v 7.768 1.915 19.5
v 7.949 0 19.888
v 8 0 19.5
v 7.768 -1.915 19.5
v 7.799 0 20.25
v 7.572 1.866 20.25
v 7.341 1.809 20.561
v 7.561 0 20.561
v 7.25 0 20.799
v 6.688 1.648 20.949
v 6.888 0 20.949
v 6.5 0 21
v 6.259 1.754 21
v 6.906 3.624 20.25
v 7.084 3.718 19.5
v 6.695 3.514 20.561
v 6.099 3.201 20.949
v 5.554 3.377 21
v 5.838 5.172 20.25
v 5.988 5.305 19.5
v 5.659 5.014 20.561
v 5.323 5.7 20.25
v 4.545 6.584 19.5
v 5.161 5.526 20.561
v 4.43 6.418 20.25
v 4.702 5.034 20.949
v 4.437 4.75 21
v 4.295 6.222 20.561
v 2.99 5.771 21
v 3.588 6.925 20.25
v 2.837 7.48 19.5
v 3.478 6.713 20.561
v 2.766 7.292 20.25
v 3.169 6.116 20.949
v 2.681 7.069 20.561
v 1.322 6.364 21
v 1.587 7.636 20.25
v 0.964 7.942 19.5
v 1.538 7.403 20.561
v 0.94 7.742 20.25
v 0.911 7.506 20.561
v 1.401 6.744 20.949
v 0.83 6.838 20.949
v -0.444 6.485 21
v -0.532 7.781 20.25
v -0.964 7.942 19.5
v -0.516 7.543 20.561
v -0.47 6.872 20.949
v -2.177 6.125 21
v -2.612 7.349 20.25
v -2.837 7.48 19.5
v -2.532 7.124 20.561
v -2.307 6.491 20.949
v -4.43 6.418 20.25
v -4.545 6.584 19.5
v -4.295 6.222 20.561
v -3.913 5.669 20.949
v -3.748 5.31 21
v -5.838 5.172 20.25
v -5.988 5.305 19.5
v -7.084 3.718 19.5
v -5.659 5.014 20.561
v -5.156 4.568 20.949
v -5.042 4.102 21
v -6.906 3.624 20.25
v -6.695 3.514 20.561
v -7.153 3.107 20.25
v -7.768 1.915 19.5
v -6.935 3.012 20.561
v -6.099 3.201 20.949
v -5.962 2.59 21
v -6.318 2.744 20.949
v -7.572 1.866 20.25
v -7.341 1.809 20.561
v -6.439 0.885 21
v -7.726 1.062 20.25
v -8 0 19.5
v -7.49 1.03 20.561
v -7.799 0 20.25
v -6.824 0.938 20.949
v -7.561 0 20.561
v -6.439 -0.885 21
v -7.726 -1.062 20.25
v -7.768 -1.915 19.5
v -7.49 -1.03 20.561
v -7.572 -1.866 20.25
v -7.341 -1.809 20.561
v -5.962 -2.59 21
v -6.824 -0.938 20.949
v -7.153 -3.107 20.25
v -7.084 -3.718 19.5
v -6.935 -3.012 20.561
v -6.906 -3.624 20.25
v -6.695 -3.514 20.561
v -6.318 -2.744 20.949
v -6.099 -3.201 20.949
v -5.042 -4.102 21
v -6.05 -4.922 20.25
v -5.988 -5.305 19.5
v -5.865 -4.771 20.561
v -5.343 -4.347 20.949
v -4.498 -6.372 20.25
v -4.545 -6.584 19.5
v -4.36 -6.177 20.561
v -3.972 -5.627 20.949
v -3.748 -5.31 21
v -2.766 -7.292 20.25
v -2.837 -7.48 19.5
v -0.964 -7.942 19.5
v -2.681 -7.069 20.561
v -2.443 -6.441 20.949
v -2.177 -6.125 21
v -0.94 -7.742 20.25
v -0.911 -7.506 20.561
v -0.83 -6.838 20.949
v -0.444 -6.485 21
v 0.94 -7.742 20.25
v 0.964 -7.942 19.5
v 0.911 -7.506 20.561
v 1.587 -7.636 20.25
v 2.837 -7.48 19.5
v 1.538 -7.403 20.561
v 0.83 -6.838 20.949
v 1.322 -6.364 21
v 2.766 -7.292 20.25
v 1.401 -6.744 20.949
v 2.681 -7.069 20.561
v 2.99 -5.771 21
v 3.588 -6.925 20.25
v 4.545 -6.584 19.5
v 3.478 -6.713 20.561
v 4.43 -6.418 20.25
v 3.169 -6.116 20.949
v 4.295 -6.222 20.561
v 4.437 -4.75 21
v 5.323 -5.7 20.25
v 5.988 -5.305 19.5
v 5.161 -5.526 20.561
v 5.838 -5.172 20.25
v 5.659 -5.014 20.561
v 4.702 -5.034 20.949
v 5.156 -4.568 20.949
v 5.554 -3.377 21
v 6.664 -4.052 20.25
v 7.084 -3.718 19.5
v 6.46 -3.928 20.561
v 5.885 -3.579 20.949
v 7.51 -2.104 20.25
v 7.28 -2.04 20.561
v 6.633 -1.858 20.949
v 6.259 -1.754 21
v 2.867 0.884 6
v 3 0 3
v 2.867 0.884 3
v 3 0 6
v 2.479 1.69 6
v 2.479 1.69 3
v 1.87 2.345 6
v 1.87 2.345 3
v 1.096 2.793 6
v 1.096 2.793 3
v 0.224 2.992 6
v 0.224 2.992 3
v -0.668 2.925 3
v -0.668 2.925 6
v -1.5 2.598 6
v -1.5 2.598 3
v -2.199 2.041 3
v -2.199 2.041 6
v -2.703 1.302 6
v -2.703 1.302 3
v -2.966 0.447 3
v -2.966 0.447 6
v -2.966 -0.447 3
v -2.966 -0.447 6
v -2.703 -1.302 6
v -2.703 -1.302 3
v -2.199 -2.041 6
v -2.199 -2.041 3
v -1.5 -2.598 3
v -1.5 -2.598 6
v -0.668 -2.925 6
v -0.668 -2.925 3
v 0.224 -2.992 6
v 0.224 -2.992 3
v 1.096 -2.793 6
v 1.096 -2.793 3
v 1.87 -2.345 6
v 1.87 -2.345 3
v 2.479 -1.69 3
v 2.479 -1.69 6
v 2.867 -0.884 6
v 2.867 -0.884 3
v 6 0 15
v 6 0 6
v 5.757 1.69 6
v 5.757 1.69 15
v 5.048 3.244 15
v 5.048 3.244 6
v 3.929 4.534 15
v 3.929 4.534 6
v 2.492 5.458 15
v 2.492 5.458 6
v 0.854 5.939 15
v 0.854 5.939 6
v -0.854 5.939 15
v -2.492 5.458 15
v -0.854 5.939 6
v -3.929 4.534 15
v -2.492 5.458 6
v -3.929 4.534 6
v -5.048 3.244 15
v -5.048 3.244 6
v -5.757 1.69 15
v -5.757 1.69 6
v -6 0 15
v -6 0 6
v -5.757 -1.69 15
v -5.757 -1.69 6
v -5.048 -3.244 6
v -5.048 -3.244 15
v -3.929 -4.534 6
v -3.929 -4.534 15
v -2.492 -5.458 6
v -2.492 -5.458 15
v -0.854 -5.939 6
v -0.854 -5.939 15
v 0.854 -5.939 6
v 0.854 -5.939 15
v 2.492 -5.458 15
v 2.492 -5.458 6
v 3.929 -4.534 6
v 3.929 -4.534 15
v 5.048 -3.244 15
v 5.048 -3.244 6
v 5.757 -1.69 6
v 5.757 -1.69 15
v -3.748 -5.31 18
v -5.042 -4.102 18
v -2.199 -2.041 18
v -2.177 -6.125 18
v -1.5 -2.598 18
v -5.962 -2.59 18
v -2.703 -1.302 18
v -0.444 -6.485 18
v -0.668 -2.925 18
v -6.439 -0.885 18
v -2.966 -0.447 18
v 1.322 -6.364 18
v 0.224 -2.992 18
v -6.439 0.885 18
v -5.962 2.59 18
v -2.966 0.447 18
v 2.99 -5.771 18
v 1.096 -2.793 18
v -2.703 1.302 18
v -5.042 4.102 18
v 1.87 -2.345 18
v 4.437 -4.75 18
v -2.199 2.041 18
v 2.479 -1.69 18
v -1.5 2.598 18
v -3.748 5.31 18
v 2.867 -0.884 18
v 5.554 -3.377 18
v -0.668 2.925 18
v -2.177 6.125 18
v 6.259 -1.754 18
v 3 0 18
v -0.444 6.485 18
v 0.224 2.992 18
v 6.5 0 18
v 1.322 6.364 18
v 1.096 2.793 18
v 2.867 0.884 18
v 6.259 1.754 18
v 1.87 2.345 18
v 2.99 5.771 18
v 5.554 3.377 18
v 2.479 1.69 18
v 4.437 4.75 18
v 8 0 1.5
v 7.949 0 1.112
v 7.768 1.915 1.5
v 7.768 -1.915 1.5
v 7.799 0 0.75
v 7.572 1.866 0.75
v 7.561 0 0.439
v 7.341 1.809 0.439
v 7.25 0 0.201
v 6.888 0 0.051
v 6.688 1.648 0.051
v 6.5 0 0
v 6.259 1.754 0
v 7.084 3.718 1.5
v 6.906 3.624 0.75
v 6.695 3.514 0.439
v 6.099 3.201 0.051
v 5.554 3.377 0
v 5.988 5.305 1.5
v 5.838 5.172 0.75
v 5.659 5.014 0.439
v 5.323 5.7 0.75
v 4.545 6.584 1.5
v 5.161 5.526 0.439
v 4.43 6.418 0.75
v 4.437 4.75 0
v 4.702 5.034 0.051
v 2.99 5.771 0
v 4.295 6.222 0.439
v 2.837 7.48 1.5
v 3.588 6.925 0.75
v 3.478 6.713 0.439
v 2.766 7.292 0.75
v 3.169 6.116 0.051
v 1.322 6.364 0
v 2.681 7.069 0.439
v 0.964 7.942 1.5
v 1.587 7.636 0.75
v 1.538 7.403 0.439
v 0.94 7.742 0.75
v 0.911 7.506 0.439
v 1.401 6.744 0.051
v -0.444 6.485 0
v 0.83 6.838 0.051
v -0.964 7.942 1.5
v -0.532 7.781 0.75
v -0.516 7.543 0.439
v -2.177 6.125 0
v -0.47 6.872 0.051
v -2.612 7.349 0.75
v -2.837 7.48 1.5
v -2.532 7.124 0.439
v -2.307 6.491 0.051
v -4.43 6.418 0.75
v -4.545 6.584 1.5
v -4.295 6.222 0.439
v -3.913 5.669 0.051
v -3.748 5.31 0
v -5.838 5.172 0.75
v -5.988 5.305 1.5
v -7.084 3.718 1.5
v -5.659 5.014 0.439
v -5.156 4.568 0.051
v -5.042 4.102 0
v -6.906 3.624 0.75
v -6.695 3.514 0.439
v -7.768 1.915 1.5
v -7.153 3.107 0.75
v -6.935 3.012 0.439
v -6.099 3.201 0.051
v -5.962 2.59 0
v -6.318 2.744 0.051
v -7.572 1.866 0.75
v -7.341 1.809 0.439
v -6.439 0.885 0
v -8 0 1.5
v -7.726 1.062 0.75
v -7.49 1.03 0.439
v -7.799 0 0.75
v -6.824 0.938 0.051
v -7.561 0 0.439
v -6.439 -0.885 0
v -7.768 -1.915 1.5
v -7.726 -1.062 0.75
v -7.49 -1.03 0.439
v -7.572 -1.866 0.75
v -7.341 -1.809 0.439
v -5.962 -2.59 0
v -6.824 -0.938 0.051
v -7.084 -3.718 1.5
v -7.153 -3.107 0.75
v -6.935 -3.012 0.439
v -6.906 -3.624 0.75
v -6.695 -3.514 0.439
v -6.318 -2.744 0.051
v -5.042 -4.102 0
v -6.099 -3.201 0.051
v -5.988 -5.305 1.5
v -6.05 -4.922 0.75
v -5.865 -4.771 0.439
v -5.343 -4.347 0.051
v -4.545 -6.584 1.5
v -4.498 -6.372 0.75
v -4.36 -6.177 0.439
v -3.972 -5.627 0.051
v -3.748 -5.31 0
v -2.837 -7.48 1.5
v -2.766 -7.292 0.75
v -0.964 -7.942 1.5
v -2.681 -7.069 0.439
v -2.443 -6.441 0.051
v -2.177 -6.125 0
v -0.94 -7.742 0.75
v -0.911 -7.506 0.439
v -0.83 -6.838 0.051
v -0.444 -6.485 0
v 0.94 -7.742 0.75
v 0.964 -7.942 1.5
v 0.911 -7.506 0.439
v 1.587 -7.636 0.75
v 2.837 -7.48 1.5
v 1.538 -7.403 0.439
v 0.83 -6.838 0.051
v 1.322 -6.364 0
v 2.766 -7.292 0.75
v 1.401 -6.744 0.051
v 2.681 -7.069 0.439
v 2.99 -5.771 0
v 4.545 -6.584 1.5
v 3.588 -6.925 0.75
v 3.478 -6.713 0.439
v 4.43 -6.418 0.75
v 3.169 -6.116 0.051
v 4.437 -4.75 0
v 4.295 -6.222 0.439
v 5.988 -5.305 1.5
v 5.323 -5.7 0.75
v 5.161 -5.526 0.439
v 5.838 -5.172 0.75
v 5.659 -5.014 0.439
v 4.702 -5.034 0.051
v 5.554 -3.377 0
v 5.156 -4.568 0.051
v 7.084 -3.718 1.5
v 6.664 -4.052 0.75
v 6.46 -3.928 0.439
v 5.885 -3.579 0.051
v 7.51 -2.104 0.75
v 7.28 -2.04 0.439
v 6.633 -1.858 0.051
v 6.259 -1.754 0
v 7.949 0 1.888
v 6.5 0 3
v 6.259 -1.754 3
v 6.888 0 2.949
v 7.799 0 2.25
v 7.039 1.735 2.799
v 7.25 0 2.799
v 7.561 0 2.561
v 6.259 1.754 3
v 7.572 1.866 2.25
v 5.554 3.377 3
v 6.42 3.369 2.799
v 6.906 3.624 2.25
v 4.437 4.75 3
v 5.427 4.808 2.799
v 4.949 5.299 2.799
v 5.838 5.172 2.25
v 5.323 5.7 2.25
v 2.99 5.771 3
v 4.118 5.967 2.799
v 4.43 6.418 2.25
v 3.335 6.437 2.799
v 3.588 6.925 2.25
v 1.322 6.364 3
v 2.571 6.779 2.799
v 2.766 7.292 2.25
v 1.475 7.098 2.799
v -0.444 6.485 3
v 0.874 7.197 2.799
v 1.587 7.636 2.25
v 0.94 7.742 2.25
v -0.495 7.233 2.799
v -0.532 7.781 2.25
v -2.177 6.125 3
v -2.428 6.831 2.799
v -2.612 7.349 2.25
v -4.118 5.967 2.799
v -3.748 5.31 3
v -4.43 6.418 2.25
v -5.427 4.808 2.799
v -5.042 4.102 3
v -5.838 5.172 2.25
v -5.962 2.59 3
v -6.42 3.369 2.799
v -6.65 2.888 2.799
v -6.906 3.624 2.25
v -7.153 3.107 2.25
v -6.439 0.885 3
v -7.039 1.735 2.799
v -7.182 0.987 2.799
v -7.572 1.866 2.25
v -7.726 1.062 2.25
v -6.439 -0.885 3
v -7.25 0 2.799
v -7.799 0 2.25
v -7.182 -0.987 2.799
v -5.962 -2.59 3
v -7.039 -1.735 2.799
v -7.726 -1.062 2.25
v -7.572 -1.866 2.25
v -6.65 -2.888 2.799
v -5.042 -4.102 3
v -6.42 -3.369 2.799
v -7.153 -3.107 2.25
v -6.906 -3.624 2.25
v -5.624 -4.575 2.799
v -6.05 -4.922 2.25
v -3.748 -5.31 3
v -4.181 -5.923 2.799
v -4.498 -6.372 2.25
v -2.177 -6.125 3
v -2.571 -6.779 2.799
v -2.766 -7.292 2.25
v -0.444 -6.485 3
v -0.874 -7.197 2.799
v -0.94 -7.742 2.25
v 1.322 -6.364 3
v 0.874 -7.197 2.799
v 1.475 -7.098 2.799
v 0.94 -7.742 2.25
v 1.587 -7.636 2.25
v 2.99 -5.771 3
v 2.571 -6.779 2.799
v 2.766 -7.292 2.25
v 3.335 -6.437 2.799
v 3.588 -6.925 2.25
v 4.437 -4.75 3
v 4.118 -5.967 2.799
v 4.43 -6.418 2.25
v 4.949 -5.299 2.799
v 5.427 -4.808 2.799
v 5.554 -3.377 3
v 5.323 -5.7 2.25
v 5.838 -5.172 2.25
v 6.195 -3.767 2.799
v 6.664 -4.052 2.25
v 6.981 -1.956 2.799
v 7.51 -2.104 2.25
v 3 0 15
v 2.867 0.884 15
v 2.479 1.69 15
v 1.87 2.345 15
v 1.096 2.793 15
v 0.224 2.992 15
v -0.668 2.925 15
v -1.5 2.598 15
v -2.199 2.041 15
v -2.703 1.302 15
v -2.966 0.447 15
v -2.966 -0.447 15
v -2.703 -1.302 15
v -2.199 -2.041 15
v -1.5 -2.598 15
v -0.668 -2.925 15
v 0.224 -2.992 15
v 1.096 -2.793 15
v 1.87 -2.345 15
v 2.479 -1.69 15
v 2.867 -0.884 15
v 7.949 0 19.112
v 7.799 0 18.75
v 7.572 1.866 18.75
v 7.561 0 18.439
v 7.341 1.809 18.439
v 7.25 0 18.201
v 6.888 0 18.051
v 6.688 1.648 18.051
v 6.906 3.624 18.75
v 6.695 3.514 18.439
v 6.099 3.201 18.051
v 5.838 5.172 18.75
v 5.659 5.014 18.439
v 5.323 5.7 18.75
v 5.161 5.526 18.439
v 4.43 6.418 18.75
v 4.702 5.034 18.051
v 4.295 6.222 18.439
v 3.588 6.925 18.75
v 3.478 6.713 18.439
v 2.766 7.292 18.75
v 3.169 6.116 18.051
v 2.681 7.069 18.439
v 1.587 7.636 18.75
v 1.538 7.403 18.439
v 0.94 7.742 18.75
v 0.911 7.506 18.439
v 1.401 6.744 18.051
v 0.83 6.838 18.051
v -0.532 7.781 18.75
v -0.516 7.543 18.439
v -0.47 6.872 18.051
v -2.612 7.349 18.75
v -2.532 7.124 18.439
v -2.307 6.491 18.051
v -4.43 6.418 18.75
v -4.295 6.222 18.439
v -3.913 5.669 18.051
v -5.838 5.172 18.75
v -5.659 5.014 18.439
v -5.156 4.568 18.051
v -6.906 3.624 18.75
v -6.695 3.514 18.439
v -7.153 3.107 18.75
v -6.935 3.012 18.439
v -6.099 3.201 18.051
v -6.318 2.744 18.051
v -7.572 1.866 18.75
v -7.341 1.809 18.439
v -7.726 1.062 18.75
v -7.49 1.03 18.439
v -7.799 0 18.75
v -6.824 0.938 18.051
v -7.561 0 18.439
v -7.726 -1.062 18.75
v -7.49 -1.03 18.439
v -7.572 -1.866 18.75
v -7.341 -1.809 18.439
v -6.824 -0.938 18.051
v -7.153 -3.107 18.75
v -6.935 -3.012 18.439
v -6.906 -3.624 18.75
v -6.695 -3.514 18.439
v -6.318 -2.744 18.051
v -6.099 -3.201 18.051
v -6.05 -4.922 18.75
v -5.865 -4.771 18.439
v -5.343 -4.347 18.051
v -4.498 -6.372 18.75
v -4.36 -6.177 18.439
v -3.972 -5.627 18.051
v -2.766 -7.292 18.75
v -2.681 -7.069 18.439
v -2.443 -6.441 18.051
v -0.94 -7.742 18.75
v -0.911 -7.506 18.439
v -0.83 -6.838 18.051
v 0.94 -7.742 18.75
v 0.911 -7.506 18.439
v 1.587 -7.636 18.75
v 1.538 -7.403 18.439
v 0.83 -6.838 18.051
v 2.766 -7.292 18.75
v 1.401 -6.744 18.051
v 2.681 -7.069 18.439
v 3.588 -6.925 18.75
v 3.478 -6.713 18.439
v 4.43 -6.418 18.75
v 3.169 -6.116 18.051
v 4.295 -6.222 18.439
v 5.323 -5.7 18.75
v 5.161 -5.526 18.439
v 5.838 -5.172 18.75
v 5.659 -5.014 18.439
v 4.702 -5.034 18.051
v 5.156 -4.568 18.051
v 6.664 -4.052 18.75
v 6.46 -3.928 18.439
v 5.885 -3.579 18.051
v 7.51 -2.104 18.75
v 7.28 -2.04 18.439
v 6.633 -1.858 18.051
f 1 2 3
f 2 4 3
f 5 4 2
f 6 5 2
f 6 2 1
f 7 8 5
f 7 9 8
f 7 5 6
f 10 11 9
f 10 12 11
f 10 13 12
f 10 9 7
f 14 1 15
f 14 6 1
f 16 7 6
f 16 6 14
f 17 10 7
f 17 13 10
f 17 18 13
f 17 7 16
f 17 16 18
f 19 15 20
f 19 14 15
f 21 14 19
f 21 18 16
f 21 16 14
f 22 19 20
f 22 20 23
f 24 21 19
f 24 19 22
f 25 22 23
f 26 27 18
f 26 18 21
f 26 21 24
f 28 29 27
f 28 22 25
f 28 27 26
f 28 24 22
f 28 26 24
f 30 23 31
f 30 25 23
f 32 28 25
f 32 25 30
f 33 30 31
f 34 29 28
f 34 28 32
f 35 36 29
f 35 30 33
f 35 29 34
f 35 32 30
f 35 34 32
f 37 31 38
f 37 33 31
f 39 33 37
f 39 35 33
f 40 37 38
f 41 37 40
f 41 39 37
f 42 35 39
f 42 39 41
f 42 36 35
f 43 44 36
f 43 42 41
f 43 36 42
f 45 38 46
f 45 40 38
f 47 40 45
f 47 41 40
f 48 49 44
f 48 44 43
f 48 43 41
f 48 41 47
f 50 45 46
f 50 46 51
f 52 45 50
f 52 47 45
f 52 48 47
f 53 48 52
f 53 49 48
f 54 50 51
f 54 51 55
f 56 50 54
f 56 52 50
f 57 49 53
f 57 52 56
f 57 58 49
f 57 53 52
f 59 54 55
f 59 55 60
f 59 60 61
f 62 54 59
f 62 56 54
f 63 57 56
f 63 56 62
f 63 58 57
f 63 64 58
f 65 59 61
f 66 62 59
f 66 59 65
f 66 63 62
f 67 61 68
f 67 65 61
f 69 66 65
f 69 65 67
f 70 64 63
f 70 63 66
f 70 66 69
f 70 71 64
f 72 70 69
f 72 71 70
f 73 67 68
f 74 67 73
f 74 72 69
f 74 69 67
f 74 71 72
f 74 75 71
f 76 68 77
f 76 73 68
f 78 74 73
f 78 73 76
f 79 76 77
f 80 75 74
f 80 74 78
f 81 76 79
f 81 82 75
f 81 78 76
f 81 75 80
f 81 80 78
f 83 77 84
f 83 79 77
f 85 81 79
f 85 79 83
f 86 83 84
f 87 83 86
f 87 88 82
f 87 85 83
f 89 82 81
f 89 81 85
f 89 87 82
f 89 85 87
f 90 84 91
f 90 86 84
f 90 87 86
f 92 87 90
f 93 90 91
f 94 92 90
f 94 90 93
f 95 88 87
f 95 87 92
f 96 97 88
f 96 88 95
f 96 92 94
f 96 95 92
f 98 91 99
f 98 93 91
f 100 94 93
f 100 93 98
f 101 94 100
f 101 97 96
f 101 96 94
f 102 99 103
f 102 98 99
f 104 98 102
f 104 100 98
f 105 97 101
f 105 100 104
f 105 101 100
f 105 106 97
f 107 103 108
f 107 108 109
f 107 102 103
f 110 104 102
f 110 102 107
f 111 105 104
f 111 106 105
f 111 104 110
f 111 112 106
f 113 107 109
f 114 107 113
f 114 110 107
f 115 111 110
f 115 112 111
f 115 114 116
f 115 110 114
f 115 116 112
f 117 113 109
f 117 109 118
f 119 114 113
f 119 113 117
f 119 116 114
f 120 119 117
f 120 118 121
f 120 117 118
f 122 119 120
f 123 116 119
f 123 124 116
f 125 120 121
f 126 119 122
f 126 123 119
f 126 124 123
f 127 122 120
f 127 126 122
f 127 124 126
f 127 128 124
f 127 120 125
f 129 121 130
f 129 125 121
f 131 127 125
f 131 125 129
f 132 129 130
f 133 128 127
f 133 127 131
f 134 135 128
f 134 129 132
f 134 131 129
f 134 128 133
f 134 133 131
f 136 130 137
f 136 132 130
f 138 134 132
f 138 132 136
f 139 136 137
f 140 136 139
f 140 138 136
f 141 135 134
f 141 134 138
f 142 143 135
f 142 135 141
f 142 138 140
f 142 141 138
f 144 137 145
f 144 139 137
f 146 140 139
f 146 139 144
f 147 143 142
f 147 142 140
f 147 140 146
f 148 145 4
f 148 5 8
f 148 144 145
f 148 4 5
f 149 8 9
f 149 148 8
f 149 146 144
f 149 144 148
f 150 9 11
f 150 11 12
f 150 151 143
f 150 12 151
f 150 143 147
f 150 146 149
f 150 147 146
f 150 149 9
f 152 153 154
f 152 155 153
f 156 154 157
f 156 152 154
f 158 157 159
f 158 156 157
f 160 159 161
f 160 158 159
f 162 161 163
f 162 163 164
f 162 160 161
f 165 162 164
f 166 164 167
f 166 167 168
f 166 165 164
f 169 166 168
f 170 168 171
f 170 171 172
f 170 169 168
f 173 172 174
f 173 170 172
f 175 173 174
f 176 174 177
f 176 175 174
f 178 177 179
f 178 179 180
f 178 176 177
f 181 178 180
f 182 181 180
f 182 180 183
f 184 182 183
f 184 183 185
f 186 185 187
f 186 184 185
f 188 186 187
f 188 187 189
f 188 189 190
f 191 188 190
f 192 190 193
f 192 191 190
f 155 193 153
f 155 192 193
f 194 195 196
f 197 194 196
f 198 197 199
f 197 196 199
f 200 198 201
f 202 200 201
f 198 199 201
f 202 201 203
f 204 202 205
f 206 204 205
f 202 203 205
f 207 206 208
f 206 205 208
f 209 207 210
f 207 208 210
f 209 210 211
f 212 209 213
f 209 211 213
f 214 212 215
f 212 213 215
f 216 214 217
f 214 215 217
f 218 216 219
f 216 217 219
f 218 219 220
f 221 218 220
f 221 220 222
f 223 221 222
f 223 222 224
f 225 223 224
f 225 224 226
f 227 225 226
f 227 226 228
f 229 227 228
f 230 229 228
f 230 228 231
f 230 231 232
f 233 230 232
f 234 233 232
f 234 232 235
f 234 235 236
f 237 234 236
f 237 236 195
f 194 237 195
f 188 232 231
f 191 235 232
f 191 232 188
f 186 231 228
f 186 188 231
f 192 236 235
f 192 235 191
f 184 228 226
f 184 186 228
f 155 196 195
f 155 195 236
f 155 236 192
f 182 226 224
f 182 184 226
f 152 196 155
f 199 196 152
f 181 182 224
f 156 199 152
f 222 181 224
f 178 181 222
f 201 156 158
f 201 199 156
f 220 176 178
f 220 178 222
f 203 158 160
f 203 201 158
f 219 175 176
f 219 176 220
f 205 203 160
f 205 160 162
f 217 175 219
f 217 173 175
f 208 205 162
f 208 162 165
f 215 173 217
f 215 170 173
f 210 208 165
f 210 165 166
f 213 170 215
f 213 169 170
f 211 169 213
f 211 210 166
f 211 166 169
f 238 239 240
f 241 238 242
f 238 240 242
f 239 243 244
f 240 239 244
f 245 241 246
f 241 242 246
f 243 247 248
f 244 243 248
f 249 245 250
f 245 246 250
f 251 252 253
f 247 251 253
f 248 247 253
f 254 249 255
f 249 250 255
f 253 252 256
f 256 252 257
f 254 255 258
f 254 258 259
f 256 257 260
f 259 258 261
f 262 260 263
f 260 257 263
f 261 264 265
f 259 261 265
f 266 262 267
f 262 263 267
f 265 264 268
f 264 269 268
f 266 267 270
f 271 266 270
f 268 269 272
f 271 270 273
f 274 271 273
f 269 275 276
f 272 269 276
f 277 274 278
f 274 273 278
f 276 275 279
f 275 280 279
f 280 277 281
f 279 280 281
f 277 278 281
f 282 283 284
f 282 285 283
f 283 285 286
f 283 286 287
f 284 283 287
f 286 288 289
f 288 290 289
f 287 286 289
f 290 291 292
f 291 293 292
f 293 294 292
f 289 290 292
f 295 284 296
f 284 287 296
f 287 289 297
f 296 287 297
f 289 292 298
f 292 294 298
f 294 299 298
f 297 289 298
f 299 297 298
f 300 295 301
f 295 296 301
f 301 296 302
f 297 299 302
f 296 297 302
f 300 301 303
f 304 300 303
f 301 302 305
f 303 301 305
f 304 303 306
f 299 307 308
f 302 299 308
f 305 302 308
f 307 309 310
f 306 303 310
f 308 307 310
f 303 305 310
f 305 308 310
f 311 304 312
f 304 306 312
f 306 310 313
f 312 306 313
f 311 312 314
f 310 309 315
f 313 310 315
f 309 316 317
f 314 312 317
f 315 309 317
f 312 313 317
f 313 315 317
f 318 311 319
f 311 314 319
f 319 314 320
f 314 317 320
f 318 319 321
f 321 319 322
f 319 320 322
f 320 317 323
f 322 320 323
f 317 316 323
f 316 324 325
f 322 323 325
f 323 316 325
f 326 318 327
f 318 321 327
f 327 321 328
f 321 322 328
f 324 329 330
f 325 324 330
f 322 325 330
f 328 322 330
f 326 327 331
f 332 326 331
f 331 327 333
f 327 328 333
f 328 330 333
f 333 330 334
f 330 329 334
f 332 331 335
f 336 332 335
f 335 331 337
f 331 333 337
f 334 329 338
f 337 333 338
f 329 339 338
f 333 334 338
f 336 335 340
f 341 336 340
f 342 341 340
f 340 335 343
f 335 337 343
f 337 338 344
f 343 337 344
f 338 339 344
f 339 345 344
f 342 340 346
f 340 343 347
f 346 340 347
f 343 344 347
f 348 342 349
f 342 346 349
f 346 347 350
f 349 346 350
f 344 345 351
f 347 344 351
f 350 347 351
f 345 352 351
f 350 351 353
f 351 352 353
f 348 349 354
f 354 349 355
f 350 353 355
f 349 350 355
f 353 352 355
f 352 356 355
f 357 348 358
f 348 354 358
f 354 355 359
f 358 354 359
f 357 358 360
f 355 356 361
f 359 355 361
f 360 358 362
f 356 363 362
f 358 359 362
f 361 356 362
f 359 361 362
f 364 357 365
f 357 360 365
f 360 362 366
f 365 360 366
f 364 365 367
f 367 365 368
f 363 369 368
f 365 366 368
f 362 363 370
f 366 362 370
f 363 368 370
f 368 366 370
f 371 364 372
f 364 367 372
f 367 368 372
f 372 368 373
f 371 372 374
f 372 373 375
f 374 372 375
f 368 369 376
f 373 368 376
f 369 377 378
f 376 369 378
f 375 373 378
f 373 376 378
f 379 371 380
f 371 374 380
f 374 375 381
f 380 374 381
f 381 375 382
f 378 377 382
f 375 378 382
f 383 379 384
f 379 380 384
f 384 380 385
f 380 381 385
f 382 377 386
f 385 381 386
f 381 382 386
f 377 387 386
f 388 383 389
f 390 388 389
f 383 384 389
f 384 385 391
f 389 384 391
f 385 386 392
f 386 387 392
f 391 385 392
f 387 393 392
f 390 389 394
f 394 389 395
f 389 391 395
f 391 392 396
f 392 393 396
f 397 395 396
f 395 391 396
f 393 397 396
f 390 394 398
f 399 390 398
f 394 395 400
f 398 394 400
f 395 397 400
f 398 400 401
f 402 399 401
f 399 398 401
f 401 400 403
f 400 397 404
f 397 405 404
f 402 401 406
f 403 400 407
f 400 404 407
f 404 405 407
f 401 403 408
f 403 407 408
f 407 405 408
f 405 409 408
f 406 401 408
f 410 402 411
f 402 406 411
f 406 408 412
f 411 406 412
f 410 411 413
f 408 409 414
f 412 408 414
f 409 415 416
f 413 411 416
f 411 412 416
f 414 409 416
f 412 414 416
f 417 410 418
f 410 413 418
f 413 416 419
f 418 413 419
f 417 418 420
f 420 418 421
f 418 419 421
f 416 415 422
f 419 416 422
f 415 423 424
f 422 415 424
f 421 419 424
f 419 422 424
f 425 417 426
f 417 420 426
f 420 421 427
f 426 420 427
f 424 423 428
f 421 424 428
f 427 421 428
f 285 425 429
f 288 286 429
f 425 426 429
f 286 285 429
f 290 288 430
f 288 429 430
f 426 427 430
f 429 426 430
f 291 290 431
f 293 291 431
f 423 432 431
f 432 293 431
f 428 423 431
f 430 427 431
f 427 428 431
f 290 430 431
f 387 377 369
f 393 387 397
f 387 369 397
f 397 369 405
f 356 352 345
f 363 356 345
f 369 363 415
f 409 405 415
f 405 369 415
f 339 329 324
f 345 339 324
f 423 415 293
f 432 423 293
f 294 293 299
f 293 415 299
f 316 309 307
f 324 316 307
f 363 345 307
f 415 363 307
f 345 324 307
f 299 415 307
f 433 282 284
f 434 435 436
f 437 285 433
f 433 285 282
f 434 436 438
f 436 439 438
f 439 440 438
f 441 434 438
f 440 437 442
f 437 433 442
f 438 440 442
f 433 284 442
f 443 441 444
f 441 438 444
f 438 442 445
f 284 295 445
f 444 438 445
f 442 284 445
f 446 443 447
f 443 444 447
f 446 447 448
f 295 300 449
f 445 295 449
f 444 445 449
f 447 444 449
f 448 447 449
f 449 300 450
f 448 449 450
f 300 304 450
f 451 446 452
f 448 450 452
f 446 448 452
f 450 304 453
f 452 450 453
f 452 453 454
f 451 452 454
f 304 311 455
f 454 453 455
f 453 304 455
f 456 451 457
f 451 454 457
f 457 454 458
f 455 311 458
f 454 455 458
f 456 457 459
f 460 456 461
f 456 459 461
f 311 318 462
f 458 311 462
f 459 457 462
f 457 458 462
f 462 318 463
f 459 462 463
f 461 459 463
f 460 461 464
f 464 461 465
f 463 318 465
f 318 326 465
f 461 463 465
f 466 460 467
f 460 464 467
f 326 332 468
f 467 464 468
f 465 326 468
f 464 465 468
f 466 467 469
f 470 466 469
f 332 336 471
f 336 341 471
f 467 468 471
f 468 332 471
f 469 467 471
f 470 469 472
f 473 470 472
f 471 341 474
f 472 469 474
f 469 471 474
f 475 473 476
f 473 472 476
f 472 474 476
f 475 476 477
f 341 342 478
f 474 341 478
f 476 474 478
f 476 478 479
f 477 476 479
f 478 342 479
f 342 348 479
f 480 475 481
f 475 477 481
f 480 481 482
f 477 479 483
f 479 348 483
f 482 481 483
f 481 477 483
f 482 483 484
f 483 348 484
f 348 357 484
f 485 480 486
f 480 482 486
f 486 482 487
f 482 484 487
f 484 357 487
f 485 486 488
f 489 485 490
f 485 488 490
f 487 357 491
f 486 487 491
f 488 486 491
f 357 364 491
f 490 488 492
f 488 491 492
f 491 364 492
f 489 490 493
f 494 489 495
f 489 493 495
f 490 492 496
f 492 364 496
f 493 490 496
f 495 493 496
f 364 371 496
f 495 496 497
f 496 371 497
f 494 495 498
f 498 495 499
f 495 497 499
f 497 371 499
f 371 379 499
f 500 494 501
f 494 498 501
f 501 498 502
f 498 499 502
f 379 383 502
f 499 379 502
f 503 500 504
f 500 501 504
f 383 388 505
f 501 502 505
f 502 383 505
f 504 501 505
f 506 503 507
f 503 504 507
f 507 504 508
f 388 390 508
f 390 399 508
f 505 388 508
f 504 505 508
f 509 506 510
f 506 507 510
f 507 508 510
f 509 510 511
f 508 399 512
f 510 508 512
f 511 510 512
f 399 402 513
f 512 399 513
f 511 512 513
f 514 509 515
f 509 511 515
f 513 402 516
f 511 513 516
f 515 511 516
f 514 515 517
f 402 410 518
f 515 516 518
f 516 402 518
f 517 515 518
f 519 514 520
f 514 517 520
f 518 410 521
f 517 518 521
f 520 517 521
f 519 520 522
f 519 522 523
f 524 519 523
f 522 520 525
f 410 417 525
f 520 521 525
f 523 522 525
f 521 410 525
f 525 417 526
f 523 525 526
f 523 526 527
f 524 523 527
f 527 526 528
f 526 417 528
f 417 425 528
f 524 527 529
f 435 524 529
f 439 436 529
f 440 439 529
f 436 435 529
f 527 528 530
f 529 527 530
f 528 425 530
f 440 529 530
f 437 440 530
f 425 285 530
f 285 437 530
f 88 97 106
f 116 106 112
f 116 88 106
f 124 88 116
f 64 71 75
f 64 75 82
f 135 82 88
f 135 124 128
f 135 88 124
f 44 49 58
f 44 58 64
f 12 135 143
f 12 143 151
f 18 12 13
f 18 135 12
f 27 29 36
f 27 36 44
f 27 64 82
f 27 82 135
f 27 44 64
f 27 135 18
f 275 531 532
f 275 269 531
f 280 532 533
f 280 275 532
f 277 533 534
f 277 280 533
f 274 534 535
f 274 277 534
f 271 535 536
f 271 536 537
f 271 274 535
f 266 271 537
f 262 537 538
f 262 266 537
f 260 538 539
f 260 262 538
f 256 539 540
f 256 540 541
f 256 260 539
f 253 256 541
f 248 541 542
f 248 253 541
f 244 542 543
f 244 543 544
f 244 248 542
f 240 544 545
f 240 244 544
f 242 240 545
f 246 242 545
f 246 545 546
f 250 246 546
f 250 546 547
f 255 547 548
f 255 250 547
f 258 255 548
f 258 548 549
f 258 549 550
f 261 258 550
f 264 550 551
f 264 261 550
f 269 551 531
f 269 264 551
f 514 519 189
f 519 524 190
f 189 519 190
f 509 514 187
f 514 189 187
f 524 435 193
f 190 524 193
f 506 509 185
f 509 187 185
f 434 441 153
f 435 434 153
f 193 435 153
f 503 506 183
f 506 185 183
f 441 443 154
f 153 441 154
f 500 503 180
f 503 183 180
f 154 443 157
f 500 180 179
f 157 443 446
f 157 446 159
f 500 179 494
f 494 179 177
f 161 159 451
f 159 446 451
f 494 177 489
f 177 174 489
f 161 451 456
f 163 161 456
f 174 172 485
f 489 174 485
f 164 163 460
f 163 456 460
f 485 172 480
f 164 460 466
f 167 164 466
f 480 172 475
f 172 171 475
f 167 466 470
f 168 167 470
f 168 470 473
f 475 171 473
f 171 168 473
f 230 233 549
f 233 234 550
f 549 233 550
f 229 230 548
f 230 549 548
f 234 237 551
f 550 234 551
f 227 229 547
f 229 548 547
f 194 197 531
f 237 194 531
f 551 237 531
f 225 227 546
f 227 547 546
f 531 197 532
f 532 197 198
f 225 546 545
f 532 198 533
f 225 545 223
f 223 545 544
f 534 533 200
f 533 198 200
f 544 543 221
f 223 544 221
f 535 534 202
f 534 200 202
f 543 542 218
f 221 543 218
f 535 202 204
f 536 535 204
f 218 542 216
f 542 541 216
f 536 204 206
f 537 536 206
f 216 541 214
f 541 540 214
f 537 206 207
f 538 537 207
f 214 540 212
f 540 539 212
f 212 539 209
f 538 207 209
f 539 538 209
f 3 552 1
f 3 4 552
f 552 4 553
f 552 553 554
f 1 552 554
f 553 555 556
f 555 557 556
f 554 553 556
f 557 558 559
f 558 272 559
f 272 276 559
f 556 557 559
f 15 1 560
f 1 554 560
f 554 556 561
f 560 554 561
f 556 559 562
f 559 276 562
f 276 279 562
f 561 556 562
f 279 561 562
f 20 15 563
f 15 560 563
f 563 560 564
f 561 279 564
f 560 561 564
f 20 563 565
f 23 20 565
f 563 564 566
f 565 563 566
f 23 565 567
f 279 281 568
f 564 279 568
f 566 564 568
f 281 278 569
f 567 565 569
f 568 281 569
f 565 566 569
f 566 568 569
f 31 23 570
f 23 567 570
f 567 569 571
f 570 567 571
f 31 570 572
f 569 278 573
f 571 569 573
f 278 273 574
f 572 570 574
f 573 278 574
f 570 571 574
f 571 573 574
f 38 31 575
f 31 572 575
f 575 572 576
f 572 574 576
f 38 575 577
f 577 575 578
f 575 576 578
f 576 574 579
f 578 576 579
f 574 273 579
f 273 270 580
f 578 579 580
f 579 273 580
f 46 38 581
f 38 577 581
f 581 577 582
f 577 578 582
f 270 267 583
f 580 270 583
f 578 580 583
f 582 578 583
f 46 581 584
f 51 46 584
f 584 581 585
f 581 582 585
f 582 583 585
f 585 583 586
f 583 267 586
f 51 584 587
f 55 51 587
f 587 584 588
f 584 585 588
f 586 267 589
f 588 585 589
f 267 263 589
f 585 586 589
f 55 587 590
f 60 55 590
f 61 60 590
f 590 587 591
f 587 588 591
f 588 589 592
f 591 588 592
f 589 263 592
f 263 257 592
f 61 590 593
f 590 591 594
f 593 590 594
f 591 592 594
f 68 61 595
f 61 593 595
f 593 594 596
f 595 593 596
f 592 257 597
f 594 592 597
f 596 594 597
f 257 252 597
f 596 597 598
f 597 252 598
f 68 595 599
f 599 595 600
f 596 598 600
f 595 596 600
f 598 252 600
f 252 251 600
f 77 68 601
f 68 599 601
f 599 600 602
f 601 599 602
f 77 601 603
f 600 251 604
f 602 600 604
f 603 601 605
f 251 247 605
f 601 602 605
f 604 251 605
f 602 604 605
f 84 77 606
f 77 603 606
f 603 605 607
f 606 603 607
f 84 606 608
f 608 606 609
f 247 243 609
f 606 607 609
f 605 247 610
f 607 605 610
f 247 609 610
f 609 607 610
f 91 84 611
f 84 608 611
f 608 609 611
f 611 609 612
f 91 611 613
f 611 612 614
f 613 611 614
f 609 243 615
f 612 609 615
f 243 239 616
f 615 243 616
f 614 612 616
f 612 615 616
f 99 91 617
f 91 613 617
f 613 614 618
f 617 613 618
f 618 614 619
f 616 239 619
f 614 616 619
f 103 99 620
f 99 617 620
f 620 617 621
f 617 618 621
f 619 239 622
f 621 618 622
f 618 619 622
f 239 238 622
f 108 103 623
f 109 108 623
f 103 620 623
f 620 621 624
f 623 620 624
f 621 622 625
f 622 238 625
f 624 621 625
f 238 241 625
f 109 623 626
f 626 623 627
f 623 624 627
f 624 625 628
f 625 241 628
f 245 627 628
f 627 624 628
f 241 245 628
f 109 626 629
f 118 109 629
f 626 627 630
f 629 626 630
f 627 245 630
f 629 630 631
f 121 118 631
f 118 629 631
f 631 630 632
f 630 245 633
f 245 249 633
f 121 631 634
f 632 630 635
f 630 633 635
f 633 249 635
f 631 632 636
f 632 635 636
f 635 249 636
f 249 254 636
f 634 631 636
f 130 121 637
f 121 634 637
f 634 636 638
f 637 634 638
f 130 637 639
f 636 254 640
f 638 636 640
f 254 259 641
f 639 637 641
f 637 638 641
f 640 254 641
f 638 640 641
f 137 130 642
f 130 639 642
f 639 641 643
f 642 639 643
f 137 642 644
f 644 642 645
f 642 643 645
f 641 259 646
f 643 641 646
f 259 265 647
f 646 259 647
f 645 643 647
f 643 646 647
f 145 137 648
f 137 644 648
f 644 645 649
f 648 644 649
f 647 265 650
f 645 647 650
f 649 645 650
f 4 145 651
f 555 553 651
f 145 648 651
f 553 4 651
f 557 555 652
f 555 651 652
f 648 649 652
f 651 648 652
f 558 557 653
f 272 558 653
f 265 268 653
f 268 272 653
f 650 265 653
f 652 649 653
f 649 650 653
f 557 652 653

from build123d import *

# Parameters (mm, degrees)
F0_R     = 8
F1_DEPTH = 3
F2_R     = 6
F3_DEPTH = 15
F4_R     = 8
F4_R_2   = 6
F5_DEPTH = 3
F6_R     = 1.49999
F7_W     = 3
F7_H     = 3


# Not quite as in the source:
# - a fillet or chamfer is up to 0.001 mm smaller than in the source, because OpenCascade refuses the exact size


with BuildPart() as f1:
    # F0 (on Top) → F1 (new body)
    with BuildSketch(Plane.XY):
        Circle(F0_R)
    extrude(amount=F1_DEPTH)

    # F2 (on face) → F3 (join)
    with BuildSketch(Plane.XY.offset(3)):
        Circle(F2_R)
    extrude(amount=F3_DEPTH)

    # F4 (on face) → F5 (join)
    with BuildSketch(Plane.XY.offset(18)):
        Circle(F4_R)
        Circle(F4_R_2, mode=Mode.SUBTRACT)
        Circle(F4_R_2)
    extrude(amount=F5_DEPTH)

    # F6 (radius 1.5 in the source; OpenCascade refuses exactly that, so slightly less here)
    f6_edges = [f1.edges().sort_by_distance(p)[0] for p in [
        (-8, 0, 21),
        (-8, 0, 18),
        (-8, 0, 3),
        (-8, 0, 0),
    ]]
    fillet(f6_edges, radius=F6_R)

    # F7 (on Front) → F8 (revolve, cut)
    with BuildSketch(Plane.XZ):
        with Locations((4.5, 4.5)):
            Rectangle(F7_W, F7_H)
        with Locations((4.5, 16.5)):
            Rectangle(F7_W, F7_H)
    revolve(axis=Axis((0, 0, 11.7473863065), (0, 0, 1)), mode=Mode.SUBTRACT)


solid = f1.part
